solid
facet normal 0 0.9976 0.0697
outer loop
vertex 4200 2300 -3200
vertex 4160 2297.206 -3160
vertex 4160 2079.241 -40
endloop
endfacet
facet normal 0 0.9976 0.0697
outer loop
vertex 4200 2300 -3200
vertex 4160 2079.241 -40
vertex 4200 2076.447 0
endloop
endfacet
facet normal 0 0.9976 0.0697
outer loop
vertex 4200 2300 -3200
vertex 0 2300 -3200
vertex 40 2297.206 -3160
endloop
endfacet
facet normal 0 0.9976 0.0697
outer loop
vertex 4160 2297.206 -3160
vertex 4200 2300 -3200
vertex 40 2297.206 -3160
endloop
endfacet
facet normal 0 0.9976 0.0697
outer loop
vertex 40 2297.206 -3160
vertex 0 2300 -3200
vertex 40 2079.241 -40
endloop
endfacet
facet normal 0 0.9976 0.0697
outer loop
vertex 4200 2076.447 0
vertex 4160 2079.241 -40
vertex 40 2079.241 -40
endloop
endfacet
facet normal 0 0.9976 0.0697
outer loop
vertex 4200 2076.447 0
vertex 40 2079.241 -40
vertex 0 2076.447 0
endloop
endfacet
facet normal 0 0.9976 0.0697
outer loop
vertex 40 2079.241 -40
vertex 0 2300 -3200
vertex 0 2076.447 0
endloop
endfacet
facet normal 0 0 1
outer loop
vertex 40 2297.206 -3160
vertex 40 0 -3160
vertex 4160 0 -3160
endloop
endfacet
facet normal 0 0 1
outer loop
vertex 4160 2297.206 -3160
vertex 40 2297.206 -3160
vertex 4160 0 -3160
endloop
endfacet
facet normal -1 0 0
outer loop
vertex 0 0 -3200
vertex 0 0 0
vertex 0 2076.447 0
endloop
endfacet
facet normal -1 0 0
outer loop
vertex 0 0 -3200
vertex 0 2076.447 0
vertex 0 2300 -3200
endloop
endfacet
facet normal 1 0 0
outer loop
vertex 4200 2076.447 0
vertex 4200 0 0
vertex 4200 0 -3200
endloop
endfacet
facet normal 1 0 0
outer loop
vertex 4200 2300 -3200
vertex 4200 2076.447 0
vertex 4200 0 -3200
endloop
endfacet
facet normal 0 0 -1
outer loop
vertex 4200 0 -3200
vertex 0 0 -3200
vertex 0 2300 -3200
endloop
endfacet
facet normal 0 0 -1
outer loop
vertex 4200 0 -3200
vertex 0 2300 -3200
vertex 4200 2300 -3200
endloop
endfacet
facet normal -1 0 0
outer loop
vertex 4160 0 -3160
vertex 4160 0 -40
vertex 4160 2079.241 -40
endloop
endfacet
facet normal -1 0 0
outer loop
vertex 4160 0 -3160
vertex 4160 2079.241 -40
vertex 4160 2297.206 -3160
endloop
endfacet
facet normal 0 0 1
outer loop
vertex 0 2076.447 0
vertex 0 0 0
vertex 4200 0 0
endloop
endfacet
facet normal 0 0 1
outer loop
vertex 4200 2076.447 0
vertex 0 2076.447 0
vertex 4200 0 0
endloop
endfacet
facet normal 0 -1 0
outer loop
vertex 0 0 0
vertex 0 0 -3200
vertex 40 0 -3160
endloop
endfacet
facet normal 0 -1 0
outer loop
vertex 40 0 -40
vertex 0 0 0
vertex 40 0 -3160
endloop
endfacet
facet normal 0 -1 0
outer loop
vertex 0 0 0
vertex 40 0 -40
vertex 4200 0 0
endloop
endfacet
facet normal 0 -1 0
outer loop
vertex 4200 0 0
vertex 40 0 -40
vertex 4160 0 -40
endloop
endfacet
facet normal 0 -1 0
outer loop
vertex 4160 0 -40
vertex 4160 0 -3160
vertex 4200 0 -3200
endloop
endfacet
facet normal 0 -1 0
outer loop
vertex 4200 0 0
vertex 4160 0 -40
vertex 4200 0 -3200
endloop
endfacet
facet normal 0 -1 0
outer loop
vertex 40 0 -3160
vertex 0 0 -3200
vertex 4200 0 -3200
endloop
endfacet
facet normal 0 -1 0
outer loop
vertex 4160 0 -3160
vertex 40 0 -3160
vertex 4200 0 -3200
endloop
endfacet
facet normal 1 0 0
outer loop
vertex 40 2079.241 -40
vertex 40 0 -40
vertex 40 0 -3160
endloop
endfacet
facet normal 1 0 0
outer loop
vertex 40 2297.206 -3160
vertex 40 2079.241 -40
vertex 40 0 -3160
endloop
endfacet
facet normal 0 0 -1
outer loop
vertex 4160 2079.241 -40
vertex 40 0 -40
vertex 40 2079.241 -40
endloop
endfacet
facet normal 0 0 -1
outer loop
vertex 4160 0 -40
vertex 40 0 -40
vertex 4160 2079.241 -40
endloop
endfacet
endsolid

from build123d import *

# Parameters (mm, degrees)
SKETCH_1_W          = 4200
SKETCH_1_H          = 3200
SKETCH_1_W_2        = 4120
SKETCH_1_H_2        = 3120
EXTRUDE_1_DEPTH     = 2300
SKETCH_2_OUTSIDE_W  = 4353.868
SKETCH_2_OUTSIDE_H  = 3453.868
CUT_EXTRUDE_1_DEPTH = 4201


with BuildPart() as part:
    # Эскиз1 → Вытянуть-Тонкостенный1 (new body)
    with BuildSketch(Plane(origin=(0, 0, 0), x_dir=(1, 0, 0), z_dir=(0, 1, 0))):
        with Locations((2100, 1600)):
            Rectangle(SKETCH_1_W, SKETCH_1_H)
        with Locations((2100, 1600)):
            Rectangle(SKETCH_1_W_2, SKETCH_1_H_2, mode=Mode.SUBTRACT)
    extrude(amount=EXTRUDE_1_DEPTH)

    # Эскиз2 outside → Вырез-Вытянуть1 (cut, through all)
    with BuildSketch(Plane.ZY):
        with Locations((-1600, 1150)):
            Rectangle(SKETCH_2_OUTSIDE_W, SKETCH_2_OUTSIDE_H)
        Polygon((-3200, 2300), (0, 2076.446830349), (0, 0), (-3200, 0), align=None, mode=Mode.SUBTRACT)
    extrude(amount=-CUT_EXTRUDE_1_DEPTH, mode=Mode.SUBTRACT)


solid = part.part
